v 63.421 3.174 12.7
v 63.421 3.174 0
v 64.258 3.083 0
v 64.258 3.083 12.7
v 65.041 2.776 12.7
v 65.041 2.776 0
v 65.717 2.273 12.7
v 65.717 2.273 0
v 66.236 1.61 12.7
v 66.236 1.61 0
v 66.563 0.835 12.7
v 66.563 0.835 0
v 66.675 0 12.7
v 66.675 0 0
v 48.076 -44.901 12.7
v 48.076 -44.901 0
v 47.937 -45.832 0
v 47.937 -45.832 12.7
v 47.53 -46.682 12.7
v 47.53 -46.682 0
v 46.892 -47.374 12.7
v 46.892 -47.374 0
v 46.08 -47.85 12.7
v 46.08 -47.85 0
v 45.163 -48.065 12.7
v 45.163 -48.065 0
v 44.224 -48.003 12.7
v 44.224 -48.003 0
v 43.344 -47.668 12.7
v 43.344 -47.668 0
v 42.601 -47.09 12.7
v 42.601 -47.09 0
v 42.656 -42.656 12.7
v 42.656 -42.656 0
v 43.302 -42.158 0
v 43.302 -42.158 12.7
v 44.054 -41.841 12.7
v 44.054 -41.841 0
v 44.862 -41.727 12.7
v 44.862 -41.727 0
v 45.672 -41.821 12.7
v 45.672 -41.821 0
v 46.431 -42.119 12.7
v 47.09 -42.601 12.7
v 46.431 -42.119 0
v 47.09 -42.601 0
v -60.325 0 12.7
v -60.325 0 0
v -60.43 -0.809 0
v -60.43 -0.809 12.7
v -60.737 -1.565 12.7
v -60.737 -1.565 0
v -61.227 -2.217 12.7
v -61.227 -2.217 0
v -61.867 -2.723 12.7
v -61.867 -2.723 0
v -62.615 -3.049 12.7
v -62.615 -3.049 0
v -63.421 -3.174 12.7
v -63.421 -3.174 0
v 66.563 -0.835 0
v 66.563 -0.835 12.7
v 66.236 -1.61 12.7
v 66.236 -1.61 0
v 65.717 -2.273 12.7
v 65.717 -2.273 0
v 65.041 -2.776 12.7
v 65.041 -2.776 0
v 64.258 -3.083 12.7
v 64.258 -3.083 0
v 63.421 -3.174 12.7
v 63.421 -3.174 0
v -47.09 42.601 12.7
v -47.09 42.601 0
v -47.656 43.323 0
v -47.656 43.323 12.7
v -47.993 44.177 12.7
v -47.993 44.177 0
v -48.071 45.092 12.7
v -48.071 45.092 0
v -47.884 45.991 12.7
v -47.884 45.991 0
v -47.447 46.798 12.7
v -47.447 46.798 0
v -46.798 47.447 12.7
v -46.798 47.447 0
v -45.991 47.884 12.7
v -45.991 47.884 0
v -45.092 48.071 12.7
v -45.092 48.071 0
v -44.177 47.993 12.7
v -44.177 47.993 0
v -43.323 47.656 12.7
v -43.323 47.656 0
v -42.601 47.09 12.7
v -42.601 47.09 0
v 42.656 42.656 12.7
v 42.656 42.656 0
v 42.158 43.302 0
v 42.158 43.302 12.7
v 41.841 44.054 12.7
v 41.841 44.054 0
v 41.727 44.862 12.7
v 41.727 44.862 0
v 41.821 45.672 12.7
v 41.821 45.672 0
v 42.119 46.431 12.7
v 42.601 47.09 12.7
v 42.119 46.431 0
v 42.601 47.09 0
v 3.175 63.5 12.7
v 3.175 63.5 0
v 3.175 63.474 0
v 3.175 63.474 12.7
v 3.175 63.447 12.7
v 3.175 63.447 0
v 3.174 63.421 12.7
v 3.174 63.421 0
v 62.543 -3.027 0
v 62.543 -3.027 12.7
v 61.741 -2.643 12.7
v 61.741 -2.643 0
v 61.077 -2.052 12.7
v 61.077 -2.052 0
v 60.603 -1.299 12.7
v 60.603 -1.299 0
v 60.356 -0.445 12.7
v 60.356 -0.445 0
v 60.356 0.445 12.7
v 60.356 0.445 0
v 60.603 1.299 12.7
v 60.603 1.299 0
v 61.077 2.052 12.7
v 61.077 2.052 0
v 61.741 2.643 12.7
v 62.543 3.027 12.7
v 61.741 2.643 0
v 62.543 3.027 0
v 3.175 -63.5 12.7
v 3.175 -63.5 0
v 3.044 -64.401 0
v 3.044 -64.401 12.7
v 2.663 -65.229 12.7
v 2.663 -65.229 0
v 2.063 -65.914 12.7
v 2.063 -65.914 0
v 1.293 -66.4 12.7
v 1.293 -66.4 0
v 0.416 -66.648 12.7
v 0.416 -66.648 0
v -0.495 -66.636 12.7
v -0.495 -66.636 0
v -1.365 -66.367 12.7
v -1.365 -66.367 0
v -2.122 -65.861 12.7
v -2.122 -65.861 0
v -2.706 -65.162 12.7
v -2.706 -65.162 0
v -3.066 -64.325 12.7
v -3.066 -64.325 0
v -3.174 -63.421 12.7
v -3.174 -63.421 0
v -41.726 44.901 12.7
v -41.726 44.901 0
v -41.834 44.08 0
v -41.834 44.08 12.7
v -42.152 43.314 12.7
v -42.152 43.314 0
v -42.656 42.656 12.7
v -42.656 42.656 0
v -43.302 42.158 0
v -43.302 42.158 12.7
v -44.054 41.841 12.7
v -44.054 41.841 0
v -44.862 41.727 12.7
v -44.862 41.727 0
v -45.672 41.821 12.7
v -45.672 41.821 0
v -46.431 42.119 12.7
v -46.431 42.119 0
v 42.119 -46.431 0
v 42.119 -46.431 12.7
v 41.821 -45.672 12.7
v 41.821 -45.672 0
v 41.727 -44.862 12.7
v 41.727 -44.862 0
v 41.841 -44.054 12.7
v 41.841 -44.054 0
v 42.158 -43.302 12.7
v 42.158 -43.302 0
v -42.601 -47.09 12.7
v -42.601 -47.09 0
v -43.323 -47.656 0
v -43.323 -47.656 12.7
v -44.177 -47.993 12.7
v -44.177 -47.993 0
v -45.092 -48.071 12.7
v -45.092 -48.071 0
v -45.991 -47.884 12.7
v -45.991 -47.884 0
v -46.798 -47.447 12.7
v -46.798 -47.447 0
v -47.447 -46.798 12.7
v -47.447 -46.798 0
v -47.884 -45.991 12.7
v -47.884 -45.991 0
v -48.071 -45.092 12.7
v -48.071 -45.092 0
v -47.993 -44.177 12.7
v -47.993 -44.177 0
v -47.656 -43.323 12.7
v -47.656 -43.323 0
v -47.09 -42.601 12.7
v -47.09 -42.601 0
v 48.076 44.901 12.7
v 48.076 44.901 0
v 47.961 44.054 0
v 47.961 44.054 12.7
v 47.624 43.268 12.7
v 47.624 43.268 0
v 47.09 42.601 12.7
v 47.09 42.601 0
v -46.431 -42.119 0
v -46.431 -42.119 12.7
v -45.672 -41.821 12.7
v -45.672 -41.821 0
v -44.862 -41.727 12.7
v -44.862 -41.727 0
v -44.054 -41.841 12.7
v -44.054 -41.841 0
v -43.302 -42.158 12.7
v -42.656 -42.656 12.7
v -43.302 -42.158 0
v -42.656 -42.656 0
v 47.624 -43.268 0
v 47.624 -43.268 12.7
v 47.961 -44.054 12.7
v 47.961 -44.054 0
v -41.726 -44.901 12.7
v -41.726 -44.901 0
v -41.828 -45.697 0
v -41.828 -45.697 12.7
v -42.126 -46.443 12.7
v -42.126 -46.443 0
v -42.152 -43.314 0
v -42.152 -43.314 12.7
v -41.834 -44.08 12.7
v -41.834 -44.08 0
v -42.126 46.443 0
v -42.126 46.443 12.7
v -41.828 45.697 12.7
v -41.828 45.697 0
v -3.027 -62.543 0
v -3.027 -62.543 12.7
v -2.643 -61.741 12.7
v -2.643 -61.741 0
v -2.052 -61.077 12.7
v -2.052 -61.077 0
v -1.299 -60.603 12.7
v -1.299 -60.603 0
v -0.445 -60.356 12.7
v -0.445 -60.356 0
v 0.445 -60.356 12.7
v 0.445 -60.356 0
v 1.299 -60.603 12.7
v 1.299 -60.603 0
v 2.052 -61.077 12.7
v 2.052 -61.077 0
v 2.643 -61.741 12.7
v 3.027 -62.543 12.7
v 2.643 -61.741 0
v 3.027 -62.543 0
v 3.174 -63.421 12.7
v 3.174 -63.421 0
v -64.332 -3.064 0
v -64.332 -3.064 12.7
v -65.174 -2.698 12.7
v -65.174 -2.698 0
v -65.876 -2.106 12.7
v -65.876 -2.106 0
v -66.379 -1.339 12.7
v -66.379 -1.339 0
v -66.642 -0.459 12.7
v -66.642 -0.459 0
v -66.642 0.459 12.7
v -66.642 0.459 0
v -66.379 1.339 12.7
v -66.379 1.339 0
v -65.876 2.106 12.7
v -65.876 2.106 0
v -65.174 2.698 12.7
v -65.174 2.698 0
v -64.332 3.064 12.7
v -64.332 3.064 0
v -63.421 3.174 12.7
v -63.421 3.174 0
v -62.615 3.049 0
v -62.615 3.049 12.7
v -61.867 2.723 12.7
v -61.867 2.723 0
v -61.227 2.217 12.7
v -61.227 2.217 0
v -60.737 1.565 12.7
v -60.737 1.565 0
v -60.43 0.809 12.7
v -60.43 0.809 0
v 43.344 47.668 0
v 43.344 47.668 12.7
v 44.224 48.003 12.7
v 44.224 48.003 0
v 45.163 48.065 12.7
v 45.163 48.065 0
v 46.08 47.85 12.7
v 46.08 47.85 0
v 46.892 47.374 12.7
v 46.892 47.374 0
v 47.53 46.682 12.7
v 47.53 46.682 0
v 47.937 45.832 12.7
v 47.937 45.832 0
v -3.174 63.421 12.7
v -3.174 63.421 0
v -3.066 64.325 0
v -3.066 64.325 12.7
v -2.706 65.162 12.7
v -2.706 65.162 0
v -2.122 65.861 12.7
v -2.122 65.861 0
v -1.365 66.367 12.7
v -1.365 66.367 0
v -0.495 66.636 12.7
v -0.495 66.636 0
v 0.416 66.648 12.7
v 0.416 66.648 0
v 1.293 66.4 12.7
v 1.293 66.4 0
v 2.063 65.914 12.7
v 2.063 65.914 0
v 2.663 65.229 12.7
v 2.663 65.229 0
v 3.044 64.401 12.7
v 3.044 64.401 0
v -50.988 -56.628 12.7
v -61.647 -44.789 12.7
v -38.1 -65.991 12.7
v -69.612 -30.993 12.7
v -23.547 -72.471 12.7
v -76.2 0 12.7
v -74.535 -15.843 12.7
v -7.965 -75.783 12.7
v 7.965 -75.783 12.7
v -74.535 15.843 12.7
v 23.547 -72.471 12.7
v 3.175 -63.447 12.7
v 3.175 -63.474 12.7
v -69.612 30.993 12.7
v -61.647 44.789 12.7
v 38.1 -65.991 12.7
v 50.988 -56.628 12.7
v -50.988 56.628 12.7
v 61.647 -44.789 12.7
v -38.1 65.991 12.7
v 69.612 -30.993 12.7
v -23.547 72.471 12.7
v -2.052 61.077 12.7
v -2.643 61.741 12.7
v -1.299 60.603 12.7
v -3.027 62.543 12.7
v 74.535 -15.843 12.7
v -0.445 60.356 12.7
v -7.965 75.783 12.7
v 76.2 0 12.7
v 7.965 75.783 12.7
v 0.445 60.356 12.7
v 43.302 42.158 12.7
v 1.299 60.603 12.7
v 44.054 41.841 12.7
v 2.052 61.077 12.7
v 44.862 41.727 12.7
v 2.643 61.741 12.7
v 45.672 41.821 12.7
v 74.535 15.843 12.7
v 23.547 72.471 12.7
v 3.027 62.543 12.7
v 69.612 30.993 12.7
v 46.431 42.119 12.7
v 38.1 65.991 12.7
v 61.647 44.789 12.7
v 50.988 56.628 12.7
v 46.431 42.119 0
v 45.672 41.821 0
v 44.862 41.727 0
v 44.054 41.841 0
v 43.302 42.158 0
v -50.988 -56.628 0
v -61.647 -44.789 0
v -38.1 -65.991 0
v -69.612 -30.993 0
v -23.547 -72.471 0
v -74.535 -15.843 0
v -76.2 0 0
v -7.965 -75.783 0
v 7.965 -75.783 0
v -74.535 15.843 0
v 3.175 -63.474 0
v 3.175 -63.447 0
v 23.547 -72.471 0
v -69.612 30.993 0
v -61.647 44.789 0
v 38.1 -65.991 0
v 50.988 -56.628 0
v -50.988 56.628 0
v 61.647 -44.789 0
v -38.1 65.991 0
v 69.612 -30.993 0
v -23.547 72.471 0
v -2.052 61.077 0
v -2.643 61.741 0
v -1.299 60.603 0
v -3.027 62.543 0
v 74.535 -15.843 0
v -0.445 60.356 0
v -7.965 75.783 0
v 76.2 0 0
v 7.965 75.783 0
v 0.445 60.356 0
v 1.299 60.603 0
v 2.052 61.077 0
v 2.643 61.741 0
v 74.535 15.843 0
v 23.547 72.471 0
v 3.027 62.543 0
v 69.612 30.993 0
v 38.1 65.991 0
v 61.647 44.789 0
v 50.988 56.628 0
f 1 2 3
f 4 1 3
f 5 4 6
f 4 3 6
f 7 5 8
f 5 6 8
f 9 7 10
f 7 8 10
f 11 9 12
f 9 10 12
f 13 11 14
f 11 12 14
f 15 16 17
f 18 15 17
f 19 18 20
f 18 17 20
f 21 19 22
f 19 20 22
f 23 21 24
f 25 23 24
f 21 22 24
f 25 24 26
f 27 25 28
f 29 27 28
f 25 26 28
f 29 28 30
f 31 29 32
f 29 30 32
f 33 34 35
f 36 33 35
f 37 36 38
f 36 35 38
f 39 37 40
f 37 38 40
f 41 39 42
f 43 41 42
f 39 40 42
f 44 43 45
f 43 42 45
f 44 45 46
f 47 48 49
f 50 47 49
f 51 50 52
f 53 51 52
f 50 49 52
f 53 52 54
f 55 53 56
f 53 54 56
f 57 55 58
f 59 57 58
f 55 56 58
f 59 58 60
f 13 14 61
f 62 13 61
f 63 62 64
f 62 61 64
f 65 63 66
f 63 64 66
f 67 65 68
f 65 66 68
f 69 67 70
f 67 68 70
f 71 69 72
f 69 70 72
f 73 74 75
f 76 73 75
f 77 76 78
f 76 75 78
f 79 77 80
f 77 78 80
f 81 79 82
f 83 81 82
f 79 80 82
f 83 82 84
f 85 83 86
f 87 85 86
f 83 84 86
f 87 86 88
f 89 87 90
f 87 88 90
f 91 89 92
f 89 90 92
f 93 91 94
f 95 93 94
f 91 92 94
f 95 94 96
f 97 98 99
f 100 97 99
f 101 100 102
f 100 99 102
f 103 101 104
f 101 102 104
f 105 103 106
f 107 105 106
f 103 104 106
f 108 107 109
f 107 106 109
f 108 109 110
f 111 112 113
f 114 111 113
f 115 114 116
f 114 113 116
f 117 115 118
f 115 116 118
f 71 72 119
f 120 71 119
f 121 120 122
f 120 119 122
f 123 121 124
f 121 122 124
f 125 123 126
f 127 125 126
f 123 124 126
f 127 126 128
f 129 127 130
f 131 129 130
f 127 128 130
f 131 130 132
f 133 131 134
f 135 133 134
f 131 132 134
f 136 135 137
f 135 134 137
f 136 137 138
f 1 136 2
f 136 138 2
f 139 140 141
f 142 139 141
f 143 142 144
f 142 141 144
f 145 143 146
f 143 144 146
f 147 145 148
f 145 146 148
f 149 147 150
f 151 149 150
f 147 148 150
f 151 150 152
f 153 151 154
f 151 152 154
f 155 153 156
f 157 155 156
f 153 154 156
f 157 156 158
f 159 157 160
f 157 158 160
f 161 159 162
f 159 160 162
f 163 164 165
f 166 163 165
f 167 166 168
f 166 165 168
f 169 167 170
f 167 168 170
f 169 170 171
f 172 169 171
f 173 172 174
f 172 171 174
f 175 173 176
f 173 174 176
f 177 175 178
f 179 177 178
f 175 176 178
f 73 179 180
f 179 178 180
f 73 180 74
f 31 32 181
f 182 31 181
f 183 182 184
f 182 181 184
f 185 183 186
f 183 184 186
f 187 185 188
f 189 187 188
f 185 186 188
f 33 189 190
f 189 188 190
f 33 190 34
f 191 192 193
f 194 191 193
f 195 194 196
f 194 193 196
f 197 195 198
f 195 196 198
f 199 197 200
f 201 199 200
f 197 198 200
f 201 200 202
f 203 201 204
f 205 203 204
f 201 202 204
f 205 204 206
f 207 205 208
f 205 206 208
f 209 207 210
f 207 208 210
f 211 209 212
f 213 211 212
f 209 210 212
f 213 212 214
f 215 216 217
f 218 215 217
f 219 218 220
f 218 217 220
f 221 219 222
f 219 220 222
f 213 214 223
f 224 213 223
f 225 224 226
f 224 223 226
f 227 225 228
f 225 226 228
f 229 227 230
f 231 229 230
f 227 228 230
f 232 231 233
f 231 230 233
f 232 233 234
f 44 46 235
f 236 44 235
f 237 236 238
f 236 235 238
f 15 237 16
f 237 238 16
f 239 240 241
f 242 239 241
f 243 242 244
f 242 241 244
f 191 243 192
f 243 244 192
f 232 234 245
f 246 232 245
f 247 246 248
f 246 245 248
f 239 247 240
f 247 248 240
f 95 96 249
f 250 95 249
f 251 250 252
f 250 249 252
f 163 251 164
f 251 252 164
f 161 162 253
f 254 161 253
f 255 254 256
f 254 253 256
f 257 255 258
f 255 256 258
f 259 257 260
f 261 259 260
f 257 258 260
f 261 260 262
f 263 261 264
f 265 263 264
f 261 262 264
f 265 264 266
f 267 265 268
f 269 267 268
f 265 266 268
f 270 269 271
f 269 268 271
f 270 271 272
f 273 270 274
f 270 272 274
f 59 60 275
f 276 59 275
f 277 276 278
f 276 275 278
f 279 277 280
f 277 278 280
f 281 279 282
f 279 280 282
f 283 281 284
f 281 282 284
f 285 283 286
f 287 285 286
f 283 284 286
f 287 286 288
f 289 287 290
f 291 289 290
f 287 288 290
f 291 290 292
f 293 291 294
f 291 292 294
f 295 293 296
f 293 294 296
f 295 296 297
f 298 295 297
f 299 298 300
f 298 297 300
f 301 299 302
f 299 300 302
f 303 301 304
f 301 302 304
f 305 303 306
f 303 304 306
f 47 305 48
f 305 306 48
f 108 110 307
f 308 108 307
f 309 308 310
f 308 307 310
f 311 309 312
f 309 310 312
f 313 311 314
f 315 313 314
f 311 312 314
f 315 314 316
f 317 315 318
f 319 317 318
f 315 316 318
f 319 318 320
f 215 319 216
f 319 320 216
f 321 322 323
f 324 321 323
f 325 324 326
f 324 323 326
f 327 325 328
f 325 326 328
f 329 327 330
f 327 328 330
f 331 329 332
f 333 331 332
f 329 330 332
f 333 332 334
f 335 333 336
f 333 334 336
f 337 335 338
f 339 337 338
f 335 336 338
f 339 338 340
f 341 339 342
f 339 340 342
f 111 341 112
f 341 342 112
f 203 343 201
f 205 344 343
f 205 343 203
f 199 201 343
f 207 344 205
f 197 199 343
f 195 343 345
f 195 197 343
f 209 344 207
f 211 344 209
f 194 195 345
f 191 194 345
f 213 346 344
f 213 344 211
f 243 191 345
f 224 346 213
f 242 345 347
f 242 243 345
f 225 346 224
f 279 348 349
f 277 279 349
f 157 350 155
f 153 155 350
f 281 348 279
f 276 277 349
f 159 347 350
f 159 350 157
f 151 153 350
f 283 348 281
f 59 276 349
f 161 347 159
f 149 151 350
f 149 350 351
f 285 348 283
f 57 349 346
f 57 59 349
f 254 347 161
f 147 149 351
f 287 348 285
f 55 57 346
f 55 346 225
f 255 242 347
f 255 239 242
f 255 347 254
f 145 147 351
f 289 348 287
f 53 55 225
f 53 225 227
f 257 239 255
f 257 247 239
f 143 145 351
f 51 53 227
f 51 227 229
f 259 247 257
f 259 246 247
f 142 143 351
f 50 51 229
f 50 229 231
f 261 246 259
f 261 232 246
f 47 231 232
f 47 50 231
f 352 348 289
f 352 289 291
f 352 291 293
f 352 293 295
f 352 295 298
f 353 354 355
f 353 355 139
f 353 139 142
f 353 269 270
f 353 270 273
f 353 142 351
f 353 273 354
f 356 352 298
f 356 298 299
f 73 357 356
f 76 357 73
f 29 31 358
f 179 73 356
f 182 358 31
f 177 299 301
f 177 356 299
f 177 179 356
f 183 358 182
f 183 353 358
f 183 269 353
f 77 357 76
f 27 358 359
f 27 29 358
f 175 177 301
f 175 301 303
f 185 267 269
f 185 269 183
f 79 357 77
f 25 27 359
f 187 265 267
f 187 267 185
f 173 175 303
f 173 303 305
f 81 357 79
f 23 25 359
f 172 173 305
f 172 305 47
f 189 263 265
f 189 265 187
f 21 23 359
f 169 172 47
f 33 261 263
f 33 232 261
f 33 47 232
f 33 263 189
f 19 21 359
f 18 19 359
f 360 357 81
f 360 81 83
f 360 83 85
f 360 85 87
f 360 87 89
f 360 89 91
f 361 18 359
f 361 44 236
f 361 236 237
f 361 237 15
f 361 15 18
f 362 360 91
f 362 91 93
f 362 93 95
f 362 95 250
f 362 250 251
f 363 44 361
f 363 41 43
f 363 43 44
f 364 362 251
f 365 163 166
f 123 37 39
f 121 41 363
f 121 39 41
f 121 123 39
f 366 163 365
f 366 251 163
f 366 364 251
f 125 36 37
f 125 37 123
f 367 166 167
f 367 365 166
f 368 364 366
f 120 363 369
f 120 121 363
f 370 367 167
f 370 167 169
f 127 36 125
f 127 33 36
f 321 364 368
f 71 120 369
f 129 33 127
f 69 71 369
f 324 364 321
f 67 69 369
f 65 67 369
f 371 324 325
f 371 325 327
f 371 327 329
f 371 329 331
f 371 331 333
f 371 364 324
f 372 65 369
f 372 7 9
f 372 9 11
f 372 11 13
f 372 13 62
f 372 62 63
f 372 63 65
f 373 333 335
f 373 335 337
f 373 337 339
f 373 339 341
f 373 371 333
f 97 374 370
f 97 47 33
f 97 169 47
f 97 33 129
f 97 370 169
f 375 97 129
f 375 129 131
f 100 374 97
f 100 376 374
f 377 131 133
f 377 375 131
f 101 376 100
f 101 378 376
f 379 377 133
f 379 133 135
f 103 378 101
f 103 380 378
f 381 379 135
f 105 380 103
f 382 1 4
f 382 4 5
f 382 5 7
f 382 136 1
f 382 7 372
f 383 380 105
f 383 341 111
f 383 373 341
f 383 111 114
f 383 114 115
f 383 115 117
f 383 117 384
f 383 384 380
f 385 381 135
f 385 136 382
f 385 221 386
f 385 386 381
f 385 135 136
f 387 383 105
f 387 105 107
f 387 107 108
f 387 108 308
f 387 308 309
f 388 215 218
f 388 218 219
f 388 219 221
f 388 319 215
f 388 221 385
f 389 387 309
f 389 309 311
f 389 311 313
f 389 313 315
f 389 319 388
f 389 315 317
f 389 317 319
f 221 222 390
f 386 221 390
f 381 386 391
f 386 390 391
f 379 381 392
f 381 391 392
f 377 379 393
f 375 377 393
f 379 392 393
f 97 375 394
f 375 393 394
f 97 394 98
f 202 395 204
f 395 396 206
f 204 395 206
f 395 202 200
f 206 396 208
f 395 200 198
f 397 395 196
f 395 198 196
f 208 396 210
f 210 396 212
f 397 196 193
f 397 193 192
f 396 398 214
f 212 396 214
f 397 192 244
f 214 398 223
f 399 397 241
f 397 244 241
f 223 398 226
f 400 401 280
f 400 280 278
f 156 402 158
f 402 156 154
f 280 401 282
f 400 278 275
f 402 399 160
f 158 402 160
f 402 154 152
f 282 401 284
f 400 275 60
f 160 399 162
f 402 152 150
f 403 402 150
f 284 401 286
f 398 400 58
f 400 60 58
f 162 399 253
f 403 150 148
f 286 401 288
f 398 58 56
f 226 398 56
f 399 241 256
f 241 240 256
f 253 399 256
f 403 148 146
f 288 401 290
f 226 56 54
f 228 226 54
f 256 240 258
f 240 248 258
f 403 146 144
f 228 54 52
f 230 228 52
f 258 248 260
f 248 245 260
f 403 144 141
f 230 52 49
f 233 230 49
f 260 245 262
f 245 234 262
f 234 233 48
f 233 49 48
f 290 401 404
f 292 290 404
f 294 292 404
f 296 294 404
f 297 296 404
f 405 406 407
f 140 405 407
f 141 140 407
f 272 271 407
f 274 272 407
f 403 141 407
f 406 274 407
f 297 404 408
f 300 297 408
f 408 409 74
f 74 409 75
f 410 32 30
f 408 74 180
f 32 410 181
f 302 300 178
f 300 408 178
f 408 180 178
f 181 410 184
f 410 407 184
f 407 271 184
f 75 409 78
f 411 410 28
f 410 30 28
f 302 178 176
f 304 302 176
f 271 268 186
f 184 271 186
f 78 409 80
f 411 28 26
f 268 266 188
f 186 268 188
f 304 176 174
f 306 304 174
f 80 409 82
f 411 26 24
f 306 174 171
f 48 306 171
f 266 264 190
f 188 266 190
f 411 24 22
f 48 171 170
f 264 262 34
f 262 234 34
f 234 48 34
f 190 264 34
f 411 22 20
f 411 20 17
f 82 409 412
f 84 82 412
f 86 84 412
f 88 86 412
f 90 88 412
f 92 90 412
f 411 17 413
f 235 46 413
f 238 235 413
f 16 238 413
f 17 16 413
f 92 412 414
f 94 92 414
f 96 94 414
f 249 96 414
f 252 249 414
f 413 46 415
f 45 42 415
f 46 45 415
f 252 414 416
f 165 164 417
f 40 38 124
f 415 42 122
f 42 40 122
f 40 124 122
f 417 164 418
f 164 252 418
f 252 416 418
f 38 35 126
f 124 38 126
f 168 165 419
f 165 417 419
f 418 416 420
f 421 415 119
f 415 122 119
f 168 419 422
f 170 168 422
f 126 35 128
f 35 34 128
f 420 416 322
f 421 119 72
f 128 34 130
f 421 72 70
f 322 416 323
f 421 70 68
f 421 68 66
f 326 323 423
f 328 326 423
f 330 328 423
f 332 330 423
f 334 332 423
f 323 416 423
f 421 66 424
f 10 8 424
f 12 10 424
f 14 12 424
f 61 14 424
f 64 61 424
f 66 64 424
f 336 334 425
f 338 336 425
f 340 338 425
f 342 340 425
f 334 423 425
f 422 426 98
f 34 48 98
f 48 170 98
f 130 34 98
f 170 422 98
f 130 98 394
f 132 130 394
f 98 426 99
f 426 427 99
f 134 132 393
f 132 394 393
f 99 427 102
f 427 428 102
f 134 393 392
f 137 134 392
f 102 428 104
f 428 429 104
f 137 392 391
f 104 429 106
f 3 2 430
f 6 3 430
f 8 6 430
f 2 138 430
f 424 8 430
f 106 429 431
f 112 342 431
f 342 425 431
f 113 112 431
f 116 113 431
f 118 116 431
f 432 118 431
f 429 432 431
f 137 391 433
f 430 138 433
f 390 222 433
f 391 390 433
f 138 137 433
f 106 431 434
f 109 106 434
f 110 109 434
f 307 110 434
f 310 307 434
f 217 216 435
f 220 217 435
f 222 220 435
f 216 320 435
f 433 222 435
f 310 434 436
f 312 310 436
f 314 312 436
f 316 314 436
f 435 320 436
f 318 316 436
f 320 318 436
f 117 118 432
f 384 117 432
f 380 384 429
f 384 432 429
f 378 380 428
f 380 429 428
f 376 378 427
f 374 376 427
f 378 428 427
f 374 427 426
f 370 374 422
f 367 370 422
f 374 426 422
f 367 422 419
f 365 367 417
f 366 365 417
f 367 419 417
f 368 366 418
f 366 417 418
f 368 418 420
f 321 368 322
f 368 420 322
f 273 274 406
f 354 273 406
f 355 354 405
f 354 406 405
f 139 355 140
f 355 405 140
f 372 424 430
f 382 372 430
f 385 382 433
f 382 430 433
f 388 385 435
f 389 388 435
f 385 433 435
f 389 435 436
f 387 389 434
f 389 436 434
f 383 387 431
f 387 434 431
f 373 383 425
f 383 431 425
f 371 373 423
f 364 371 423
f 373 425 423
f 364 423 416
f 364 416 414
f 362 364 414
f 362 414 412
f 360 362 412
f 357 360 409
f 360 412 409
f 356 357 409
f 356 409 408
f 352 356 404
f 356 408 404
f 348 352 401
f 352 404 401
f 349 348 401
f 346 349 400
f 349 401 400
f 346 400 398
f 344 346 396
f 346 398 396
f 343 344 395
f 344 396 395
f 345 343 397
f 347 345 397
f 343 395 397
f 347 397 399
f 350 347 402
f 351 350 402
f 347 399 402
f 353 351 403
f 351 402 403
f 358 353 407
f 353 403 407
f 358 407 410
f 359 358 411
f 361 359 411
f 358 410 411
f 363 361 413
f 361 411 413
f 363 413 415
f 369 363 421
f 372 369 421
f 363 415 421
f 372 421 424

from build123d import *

# Parameters (mm, degrees)
F0_R     = 76.2
F1_DEPTH = 12.7


with BuildPart() as f1:
    # F0 (on Top) → F1 (new body)
    with BuildSketch(Plane.XY):
        Circle(F0_R)
        with BuildLine():
            ThreePointArc((47.0895163427, 42.6007916665), (58.6663503145, 24.3003979552), (63.420625, 3.1740076574))
            ThreePointArc((63.420625, 3.1740076574), (65.7168231069, 2.2729540938), (66.675, 0))
            ThreePointArc((66.675, 0), (65.7168231069, -2.2729540938), (63.420625, -3.1740076574))
            ThreePointArc((63.420625, -3.1740076574), (58.6663503145, -24.3003979552), (47.0895163427, -42.6007916665))
            ThreePointArc((47.0895163427, -42.6007916665), (47.8191799753, -43.6496863153), (48.0762806053, -44.9012806053))
            ThreePointArc((48.0762806053, -44.9012806053), (46.0795362268, -47.8495578465), (42.6007916665, -47.0895163427))
            ThreePointArc((42.6007916665, -47.0895163427), (24.3003979552, -58.6663503145), (3.1740076574, -63.420625))
            ThreePointArc((3.1740076574, -63.420625), (3.1747519047, -63.4603093986), (3.175, -63.5))
            ThreePointArc((3.175, -63.5), (-0.0396906014, -66.6747519047), (-3.1740076574, -63.420625))
            ThreePointArc((-3.1740076574, -63.420625), (-24.3003979552, -58.6663503145), (-42.6007916665, -47.0895163427))
            ThreePointArc((-42.6007916665, -47.0895163427), (-47.1463446356, -47.1463446356), (-47.0895163427, -42.6007916665))
            ThreePointArc((-47.0895163427, -42.6007916665), (-58.6663503145, -24.3003979552), (-63.420625, -3.1740076574))
            ThreePointArc((-63.420625, -3.1740076574), (-66.675, 0), (-63.420625, 3.1740076574))
            ThreePointArc((-63.420625, 3.1740076574), (-58.6663503145, 24.3003979552), (-47.0895163427, 42.6007916665))
            ThreePointArc((-47.0895163427, 42.6007916665), (-47.1463446356, 47.1463446356), (-42.6007916665, 47.0895163427))
            ThreePointArc((-42.6007916665, 47.0895163427), (-24.3003979552, 58.6663503145), (-3.1740076574, 63.420625))
            ThreePointArc((-3.1740076574, 63.420625), (-0.0396906014, 66.6747519047), (3.175, 63.5))
            ThreePointArc((3.175, 63.5), (3.1747519047, 63.4603093986), (3.1740076574, 63.420625))
            ThreePointArc((3.1740076574, 63.420625), (24.3003979552, 58.6663503145), (42.6007916665, 47.0895163427))
            ThreePointArc((42.6007916665, 47.0895163427), (46.0795362268, 47.8495578465), (48.0762806053, 44.9012806053))
            ThreePointArc((48.0762806053, 44.9012806053), (47.8191799753, 43.6496863153), (47.0895163427, 42.6007916665))
        make_face(mode=Mode.SUBTRACT)
        with BuildLine():
            Line((0, 0), (42.6562165751, 42.6562165751))
            ThreePointArc((42.6562165751, 42.6562165751), (41.7265287007, 44.8615900039), (42.6007916665, 47.0895163427))
            ThreePointArc((42.6007916665, 47.0895163427), (24.3003979552, 58.6663503145), (3.1740076574, 63.420625))
            ThreePointArc((3.1740076574, 63.420625), (0, 60.325), (-3.1740076574, 63.420625))
            ThreePointArc((-3.1740076574, 63.420625), (-24.3003979552, 58.6663503145), (-42.6007916665, 47.0895163427))
            ThreePointArc((-42.6007916665, 47.0895163427), (-41.9530033642, 46.0795362268), (-41.7262806053, 44.9012806053))
            ThreePointArc((-41.7262806053, 44.9012806053), (-41.9679630896, 43.6862607076), (-42.6562165751, 42.6562165751))
            Line((-42.6562165751, 42.6562165751), (0, 0))
        make_face()
        with BuildLine():
            Line((-42.6562165751, -42.6562165751), (0, 0))
            Line((0, 0), (-42.6562165751, 42.6562165751))
            ThreePointArc((-42.6562165751, 42.6562165751), (-44.8615900039, 41.7265287007), (-47.0895163427, 42.6007916665))
            ThreePointArc((-47.0895163427, 42.6007916665), (-58.6663503145, 24.3003979552), (-63.420625, 3.1740076574))
            ThreePointArc((-63.420625, 3.1740076574), (-61.2270459062, 2.2168231069), (-60.325, 0))
            ThreePointArc((-60.325, 0), (-61.2270459062, -2.2168231069), (-63.420625, -3.1740076574))
            ThreePointArc((-63.420625, -3.1740076574), (-58.6663503145, -24.3003979552), (-47.0895163427, -42.6007916665))
            ThreePointArc((-47.0895163427, -42.6007916665), (-44.8615900039, -41.7265287007), (-42.6562165751, -42.6562165751))
        make_face()
        with BuildLine():
            ThreePointArc((42.6007916665, -47.0895163427), (41.7265287007, -44.8615900039), (42.6562165751, -42.6562165751))
            Line((42.6562165751, -42.6562165751), (0, 0))
            Line((0, 0), (-42.6562165751, -42.6562165751))
            ThreePointArc((-42.6562165751, -42.6562165751), (-41.9679630896, -43.6862607076), (-41.7262806053, -44.9012806053))
            ThreePointArc((-41.7262806053, -44.9012806053), (-41.9530033642, -46.0795362268), (-42.6007916665, -47.0895163427))
            ThreePointArc((-42.6007916665, -47.0895163427), (-24.3003979552, -58.6663503145), (-3.1740076574, -63.420625))
            ThreePointArc((-3.1740076574, -63.420625), (0, -60.325), (3.1740076574, -63.420625))
            ThreePointArc((3.1740076574, -63.420625), (24.3003979552, -58.6663503145), (42.6007916665, -47.0895163427))
        make_face()
        with BuildLine():
            ThreePointArc((63.420625, -3.1740076574), (60.325, 0), (63.420625, 3.1740076574))
            ThreePointArc((63.420625, 3.1740076574), (58.6663503145, 24.3003979552), (47.0895163427, 42.6007916665))
            ThreePointArc((47.0895163427, 42.6007916665), (44.8615900039, 41.7265287007), (42.6562165751, 42.6562165751))
            Line((42.6562165751, 42.6562165751), (0, 0))
            Line((0, 0), (42.6562165751, -42.6562165751))
            ThreePointArc((42.6562165751, -42.6562165751), (44.8615900039, -41.7265287007), (47.0895163427, -42.6007916665))
            ThreePointArc((47.0895163427, -42.6007916665), (58.6663503145, -24.3003979552), (63.420625, -3.1740076574))
        make_face()
    extrude(amount=F1_DEPTH)


solid = f1.part
